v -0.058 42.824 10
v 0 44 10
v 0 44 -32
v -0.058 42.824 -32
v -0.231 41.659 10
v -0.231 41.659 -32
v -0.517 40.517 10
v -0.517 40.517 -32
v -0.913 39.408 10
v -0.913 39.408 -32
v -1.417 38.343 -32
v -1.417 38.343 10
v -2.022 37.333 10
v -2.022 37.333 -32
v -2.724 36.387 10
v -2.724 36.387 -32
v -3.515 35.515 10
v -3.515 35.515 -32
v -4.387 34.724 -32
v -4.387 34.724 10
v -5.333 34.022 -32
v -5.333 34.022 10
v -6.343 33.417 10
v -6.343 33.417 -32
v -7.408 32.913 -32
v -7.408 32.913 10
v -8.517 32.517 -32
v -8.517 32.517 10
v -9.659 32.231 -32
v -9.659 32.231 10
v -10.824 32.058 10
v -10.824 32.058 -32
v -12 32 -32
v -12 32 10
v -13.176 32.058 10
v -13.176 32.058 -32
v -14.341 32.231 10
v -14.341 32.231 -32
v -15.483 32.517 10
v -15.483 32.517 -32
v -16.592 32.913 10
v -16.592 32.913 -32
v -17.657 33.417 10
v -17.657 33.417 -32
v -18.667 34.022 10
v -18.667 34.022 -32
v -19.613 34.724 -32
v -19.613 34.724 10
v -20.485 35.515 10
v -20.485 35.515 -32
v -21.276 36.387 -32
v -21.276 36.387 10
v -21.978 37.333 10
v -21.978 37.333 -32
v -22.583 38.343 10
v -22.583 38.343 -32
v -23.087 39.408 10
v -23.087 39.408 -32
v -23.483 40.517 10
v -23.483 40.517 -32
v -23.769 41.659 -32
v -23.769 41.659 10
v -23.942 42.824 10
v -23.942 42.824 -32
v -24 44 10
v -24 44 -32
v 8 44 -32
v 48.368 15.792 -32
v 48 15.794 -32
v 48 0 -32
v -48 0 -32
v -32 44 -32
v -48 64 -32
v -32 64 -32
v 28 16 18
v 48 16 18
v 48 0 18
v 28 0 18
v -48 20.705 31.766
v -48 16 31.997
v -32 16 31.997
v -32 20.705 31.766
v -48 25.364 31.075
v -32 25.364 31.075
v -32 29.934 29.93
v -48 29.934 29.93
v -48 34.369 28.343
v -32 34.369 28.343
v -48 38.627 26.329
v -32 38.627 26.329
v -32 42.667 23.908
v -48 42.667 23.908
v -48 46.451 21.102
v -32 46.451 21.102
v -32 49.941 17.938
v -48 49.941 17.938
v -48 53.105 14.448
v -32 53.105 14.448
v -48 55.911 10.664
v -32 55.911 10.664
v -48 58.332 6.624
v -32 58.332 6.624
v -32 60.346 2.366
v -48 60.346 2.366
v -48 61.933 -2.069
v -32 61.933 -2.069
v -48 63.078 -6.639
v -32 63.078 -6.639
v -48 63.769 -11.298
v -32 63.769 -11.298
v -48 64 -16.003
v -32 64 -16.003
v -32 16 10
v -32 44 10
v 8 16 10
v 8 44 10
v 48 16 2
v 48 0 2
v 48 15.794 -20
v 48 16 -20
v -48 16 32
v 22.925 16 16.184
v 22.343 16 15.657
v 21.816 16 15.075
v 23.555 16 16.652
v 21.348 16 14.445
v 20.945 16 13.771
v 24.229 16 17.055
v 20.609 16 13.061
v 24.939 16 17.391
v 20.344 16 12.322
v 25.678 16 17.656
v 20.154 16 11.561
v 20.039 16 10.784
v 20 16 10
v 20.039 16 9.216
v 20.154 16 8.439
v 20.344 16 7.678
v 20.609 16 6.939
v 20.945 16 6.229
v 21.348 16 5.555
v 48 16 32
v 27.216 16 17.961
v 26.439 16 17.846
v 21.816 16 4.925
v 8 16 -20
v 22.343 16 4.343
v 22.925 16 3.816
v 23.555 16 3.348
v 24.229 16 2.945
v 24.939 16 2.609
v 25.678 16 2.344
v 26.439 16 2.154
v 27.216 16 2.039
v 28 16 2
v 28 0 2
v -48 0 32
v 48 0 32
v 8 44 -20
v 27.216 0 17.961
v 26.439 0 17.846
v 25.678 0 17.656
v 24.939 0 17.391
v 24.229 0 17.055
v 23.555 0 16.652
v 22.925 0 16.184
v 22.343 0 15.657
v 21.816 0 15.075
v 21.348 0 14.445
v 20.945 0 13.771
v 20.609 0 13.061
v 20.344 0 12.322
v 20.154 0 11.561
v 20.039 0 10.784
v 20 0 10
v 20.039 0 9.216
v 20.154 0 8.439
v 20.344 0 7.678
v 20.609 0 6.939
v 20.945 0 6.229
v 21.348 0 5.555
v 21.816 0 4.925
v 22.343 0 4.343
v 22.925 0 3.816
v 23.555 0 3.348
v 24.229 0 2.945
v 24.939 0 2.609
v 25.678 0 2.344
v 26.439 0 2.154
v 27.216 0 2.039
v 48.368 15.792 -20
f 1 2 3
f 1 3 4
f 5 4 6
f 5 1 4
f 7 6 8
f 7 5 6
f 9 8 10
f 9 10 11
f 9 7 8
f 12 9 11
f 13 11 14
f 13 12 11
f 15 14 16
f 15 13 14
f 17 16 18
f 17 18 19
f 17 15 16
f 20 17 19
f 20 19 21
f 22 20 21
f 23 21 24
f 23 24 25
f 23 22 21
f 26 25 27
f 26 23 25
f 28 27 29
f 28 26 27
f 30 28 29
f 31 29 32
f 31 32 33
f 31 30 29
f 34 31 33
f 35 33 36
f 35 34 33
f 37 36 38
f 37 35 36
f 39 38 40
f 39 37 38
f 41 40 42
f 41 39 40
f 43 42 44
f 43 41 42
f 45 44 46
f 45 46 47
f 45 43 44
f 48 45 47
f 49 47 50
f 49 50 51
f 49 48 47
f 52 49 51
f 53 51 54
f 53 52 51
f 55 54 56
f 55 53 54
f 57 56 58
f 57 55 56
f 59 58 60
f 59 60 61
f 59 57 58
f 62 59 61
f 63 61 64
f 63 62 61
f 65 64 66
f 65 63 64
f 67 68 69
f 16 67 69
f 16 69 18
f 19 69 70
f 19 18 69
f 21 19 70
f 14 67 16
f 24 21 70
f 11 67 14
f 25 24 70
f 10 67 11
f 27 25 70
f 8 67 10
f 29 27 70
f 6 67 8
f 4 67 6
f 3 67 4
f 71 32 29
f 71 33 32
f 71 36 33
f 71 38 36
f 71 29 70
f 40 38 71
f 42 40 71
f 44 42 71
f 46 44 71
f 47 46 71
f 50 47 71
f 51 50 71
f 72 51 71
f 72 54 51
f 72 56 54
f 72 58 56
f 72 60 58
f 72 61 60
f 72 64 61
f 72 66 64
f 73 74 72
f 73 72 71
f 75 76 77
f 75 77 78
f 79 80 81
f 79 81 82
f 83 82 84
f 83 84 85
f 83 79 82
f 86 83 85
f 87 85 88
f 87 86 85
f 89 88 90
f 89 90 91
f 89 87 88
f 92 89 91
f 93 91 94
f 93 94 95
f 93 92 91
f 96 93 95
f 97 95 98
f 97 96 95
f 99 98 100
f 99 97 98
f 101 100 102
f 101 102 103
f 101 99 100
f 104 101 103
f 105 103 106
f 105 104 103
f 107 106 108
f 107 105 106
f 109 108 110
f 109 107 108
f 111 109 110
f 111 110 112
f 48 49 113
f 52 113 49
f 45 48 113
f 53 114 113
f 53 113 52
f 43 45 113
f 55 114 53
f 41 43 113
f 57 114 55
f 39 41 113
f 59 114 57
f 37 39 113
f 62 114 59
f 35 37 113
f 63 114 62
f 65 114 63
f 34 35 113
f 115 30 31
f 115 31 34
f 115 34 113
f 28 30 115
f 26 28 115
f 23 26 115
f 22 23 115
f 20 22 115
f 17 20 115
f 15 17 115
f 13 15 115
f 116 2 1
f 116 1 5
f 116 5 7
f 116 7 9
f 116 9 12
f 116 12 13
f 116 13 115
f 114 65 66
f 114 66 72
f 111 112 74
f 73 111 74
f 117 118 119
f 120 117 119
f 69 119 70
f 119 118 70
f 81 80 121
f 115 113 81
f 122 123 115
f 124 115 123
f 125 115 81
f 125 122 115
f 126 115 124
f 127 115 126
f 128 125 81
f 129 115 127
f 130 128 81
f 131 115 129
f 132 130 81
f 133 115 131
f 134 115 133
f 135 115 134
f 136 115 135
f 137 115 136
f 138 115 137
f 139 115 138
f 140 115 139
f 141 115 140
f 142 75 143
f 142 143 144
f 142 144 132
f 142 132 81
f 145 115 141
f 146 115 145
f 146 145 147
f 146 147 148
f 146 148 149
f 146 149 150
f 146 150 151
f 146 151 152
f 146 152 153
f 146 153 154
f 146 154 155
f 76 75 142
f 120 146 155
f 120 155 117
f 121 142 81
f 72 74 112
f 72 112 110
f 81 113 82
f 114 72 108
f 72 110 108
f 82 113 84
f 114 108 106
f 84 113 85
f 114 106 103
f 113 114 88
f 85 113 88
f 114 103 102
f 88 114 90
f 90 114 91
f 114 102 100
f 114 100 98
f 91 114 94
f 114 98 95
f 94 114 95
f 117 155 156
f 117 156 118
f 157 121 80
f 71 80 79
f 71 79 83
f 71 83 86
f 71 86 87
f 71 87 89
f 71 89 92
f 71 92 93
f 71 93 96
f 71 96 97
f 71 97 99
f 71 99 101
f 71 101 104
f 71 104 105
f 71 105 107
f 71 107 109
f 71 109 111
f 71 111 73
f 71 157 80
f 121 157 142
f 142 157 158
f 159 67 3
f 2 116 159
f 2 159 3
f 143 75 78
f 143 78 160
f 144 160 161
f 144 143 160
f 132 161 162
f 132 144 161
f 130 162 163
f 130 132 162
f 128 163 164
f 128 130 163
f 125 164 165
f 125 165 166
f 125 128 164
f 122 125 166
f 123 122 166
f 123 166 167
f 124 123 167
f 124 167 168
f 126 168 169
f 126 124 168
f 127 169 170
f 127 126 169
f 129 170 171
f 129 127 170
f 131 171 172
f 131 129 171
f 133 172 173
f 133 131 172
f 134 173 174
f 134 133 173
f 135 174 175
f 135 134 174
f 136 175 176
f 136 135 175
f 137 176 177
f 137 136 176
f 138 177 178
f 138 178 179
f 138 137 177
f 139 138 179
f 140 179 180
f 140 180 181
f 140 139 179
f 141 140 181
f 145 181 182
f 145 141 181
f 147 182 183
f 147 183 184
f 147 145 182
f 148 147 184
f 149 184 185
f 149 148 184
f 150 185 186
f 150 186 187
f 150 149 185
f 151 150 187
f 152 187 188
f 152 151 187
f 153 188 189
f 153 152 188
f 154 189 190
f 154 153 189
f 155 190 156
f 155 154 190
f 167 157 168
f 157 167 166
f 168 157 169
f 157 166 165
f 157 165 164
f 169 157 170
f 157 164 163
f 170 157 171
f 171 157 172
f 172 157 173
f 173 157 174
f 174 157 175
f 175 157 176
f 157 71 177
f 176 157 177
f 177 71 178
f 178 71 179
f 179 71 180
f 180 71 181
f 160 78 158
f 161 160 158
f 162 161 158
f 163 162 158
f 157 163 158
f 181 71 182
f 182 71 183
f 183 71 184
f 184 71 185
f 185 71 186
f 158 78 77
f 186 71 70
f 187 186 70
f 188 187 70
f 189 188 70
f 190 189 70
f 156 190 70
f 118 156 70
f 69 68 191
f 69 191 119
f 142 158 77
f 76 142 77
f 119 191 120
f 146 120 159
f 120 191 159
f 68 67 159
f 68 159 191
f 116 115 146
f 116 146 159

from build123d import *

# Parameters (mm, degrees)
SKETCH1_W           = 96
SKETCH1_H           = 64
BOSS_EXTRUDE1_DEPTH = 16
CUT_EXTRUDE2_DEPTH  = 16
BOSS_EXTRUDE2_START = -22
BOSS_EXTRUDE2_DEPTH = 42
BOSS_EXTRUDE3_DEPTH = 16
BOSS_EXTRUDE4_DEPTH = 12


with BuildPart() as part:
    # Sketch1 → Boss-Extrude1 (new body)
    with BuildSketch(Plane(origin=(0, 0, 0), x_dir=(1, 0, 0), z_dir=(0, 1, 0))):
        Rectangle(SKETCH1_W, SKETCH1_H)
    extrude(amount=BOSS_EXTRUDE1_DEPTH)

    # Sketch2 → Cut-Extrude2 (cut)
    with BuildSketch(Plane(origin=(0, 16, 0), x_dir=(1, 0, 0), z_dir=(0, 1, 0))):
        with BuildLine():
            Line((48, -18), (28, -18))
            ThreePointArc((28, -18), (20, -10), (28, -2))
            Line((28, -2), (48, -2))
            ThreePointArc((48, -2), (56, -10), (48, -18))
        make_face()
    extrude(amount=-CUT_EXTRUDE2_DEPTH, mode=Mode.SUBTRACT)

    # Sketch3 → Boss-Extrude2 (add)
    with BuildSketch(Plane.XY.offset(32).offset(BOSS_EXTRUDE2_START)):
        with BuildLine():
            Line((-32, 44), (-32, 16))
            Line((-32, 16), (8, 16))
            Line((8, 16), (8, 44))
            Line((8, 44), (0, 44))
            ThreePointArc((0, 44), (-12, 32), (-24, 44))
            Line((-24, 44), (-32, 44))
        make_face()
    extrude(amount=-BOSS_EXTRUDE2_DEPTH)

    # Sketch5 → Boss-Extrude3 (add)
    with BuildSketch(Plane.ZY.offset(48)):
        with BuildLine():
            Line((-32, 0), (31.997051588, 0))
            Line((31.997051588, 0), (31.997051588, 16))
            ThreePointArc((31.997051588, 16), (17.938177085, 49.941125497), (-16.002948412, 64))
            Line((-16.002948412, 64), (-32, 64))
            Line((-32, 64), (-32, 0))
        make_face()
    extrude(amount=-BOSS_EXTRUDE3_DEPTH)

    # Sketch6 → Boss-Extrude4 (add)
    with BuildSketch(Plane(origin=(0, 0, -32), x_dir=(-1, 0, 0), z_dir=(0, 0, -1))):
        Polygon((-8, 44), (-48.368210029, 15.792048014), (-8, 16), align=None)
    extrude(amount=-BOSS_EXTRUDE4_DEPTH)


solid = part.part
